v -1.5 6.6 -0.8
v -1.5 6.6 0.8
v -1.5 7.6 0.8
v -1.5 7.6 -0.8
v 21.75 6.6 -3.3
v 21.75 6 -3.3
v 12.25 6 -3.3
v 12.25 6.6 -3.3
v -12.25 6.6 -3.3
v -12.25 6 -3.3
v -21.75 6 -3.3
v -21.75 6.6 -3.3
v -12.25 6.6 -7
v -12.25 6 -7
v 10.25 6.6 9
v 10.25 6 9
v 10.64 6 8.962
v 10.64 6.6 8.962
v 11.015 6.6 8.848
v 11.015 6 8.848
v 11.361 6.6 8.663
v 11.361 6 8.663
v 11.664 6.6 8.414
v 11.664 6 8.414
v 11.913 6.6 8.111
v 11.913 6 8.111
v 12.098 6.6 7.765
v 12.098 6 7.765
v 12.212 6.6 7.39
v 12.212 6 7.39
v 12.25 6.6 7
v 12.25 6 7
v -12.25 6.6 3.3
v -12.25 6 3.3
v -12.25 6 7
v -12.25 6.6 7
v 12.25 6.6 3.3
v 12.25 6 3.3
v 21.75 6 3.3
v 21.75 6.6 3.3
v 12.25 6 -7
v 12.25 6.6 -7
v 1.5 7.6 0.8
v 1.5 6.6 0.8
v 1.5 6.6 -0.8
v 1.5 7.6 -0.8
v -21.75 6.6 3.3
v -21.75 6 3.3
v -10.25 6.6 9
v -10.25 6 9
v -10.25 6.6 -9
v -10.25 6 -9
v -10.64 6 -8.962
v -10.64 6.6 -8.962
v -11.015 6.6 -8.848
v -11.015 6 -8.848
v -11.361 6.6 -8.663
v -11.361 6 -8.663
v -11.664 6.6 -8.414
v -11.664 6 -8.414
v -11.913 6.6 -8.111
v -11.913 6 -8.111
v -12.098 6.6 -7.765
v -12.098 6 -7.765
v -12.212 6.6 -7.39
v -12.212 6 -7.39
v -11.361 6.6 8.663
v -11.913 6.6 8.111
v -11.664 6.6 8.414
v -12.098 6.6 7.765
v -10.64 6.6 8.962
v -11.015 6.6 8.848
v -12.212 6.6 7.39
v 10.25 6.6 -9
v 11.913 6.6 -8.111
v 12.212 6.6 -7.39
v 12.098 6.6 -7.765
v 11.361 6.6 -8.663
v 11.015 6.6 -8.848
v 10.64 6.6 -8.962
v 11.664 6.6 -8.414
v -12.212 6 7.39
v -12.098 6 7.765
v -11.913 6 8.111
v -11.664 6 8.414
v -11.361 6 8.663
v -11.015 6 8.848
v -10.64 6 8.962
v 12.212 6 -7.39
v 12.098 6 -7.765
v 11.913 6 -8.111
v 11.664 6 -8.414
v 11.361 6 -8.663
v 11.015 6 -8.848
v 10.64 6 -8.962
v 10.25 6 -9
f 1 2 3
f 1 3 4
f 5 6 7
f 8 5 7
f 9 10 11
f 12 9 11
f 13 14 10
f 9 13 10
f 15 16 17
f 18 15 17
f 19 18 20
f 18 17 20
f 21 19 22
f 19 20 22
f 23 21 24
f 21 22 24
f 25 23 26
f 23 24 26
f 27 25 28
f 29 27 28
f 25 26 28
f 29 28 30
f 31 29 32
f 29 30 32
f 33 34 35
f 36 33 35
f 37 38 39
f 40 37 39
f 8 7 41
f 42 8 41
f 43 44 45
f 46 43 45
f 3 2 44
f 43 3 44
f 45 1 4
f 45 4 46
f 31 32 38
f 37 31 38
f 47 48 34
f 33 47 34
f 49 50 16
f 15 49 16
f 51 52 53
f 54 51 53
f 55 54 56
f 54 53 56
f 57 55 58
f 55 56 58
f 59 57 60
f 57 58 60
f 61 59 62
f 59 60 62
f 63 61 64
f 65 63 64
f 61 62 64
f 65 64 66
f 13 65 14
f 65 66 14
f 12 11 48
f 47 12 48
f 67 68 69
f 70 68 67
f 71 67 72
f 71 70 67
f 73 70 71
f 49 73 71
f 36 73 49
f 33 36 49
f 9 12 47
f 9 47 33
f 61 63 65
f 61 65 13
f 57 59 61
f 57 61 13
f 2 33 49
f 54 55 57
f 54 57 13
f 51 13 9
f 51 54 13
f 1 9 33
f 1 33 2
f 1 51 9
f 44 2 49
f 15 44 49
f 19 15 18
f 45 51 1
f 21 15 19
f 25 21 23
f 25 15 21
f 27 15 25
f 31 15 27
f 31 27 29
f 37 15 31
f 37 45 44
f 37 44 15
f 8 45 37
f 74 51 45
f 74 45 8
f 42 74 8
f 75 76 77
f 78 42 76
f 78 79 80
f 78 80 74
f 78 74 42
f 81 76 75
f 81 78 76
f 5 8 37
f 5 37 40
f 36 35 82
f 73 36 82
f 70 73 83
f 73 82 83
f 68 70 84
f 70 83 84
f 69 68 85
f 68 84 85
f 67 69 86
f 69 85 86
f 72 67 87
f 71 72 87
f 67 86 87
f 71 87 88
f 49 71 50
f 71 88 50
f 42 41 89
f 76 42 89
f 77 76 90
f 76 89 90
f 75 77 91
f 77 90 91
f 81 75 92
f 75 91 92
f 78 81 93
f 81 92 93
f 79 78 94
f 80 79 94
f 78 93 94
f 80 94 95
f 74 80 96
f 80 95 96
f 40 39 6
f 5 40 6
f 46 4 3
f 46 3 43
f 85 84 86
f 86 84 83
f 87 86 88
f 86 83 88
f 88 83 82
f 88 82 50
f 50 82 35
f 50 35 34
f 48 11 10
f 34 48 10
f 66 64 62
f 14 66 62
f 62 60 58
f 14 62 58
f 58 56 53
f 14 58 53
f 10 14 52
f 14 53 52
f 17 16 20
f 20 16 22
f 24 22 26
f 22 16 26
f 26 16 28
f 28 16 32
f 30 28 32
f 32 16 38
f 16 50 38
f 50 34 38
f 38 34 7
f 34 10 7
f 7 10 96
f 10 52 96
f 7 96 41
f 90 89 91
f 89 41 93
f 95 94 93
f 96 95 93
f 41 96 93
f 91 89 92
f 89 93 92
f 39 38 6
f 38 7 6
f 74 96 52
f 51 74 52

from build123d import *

# Parameters (mm, degrees)
STOCK_MODIFYCOMPONENTPART_1_START = 6
STOCK_MODIFYCOMPONENTPART_1_DEPTH = 0.6
SKETCH1_W                         = 3
SKETCH1_H                         = 1.6
BOSS_EXTRUDE1_DEPTH               = 1


# Read off the part's stored shape, not the designer's step: Stock-ModifyComponentPart-1
with BuildPart() as part:
    # Stock-ModifyComponentPart-1 outline → Stock-ModifyComponentPart-1 (new body)
    with BuildSketch(Plane(origin=(0, 0, 0), x_dir=(1, 0, 0), z_dir=(0, 1, 0)).offset(STOCK_MODIFYCOMPONENTPART_1_START)):
        with BuildLine():
            Line((12.25, 3.3), (12.25, 7))
            ThreePointArc((12.25, 7), (11.664213562, 8.414213562), (10.25, 9))
            Line((10.25, 9), (-10.25, 9))
            ThreePointArc((-10.25, 9), (-11.664213562, 8.414213562), (-12.25, 7))
            Line((-12.25, 7), (-12.25, 3.3))
            Line((-12.25, 3.3), (-21.75, 3.3))
            Line((-21.75, 3.3), (-21.75, -3.3))
            Line((-21.75, -3.3), (-12.25, -3.3))
            Line((-12.25, -3.3), (-12.25, -7))
            ThreePointArc((-12.25, -7), (-11.664213562, -8.414213562), (-10.25, -9))
            Line((-10.25, -9), (10.25, -9))
            ThreePointArc((10.25, -9), (11.664213562, -8.414213562), (12.25, -7))
            Line((12.25, -7), (12.25, -3.3))
            Line((12.25, -3.3), (21.75, -3.3))
            Line((21.75, -3.3), (21.75, 3.3))
            Line((21.75, 3.3), (12.25, 3.3))
        make_face()
    extrude(amount=STOCK_MODIFYCOMPONENTPART_1_DEPTH)

    # Sketch1 → Boss-Extrude1 (add)
    with BuildSketch(Plane(origin=(0, 6.6, 0), x_dir=(1, 0, 0), z_dir=(0, 1, 0))):
        Rectangle(SKETCH1_W, SKETCH1_H)
    extrude(amount=BOSS_EXTRUDE1_DEPTH)


solid = part.part
